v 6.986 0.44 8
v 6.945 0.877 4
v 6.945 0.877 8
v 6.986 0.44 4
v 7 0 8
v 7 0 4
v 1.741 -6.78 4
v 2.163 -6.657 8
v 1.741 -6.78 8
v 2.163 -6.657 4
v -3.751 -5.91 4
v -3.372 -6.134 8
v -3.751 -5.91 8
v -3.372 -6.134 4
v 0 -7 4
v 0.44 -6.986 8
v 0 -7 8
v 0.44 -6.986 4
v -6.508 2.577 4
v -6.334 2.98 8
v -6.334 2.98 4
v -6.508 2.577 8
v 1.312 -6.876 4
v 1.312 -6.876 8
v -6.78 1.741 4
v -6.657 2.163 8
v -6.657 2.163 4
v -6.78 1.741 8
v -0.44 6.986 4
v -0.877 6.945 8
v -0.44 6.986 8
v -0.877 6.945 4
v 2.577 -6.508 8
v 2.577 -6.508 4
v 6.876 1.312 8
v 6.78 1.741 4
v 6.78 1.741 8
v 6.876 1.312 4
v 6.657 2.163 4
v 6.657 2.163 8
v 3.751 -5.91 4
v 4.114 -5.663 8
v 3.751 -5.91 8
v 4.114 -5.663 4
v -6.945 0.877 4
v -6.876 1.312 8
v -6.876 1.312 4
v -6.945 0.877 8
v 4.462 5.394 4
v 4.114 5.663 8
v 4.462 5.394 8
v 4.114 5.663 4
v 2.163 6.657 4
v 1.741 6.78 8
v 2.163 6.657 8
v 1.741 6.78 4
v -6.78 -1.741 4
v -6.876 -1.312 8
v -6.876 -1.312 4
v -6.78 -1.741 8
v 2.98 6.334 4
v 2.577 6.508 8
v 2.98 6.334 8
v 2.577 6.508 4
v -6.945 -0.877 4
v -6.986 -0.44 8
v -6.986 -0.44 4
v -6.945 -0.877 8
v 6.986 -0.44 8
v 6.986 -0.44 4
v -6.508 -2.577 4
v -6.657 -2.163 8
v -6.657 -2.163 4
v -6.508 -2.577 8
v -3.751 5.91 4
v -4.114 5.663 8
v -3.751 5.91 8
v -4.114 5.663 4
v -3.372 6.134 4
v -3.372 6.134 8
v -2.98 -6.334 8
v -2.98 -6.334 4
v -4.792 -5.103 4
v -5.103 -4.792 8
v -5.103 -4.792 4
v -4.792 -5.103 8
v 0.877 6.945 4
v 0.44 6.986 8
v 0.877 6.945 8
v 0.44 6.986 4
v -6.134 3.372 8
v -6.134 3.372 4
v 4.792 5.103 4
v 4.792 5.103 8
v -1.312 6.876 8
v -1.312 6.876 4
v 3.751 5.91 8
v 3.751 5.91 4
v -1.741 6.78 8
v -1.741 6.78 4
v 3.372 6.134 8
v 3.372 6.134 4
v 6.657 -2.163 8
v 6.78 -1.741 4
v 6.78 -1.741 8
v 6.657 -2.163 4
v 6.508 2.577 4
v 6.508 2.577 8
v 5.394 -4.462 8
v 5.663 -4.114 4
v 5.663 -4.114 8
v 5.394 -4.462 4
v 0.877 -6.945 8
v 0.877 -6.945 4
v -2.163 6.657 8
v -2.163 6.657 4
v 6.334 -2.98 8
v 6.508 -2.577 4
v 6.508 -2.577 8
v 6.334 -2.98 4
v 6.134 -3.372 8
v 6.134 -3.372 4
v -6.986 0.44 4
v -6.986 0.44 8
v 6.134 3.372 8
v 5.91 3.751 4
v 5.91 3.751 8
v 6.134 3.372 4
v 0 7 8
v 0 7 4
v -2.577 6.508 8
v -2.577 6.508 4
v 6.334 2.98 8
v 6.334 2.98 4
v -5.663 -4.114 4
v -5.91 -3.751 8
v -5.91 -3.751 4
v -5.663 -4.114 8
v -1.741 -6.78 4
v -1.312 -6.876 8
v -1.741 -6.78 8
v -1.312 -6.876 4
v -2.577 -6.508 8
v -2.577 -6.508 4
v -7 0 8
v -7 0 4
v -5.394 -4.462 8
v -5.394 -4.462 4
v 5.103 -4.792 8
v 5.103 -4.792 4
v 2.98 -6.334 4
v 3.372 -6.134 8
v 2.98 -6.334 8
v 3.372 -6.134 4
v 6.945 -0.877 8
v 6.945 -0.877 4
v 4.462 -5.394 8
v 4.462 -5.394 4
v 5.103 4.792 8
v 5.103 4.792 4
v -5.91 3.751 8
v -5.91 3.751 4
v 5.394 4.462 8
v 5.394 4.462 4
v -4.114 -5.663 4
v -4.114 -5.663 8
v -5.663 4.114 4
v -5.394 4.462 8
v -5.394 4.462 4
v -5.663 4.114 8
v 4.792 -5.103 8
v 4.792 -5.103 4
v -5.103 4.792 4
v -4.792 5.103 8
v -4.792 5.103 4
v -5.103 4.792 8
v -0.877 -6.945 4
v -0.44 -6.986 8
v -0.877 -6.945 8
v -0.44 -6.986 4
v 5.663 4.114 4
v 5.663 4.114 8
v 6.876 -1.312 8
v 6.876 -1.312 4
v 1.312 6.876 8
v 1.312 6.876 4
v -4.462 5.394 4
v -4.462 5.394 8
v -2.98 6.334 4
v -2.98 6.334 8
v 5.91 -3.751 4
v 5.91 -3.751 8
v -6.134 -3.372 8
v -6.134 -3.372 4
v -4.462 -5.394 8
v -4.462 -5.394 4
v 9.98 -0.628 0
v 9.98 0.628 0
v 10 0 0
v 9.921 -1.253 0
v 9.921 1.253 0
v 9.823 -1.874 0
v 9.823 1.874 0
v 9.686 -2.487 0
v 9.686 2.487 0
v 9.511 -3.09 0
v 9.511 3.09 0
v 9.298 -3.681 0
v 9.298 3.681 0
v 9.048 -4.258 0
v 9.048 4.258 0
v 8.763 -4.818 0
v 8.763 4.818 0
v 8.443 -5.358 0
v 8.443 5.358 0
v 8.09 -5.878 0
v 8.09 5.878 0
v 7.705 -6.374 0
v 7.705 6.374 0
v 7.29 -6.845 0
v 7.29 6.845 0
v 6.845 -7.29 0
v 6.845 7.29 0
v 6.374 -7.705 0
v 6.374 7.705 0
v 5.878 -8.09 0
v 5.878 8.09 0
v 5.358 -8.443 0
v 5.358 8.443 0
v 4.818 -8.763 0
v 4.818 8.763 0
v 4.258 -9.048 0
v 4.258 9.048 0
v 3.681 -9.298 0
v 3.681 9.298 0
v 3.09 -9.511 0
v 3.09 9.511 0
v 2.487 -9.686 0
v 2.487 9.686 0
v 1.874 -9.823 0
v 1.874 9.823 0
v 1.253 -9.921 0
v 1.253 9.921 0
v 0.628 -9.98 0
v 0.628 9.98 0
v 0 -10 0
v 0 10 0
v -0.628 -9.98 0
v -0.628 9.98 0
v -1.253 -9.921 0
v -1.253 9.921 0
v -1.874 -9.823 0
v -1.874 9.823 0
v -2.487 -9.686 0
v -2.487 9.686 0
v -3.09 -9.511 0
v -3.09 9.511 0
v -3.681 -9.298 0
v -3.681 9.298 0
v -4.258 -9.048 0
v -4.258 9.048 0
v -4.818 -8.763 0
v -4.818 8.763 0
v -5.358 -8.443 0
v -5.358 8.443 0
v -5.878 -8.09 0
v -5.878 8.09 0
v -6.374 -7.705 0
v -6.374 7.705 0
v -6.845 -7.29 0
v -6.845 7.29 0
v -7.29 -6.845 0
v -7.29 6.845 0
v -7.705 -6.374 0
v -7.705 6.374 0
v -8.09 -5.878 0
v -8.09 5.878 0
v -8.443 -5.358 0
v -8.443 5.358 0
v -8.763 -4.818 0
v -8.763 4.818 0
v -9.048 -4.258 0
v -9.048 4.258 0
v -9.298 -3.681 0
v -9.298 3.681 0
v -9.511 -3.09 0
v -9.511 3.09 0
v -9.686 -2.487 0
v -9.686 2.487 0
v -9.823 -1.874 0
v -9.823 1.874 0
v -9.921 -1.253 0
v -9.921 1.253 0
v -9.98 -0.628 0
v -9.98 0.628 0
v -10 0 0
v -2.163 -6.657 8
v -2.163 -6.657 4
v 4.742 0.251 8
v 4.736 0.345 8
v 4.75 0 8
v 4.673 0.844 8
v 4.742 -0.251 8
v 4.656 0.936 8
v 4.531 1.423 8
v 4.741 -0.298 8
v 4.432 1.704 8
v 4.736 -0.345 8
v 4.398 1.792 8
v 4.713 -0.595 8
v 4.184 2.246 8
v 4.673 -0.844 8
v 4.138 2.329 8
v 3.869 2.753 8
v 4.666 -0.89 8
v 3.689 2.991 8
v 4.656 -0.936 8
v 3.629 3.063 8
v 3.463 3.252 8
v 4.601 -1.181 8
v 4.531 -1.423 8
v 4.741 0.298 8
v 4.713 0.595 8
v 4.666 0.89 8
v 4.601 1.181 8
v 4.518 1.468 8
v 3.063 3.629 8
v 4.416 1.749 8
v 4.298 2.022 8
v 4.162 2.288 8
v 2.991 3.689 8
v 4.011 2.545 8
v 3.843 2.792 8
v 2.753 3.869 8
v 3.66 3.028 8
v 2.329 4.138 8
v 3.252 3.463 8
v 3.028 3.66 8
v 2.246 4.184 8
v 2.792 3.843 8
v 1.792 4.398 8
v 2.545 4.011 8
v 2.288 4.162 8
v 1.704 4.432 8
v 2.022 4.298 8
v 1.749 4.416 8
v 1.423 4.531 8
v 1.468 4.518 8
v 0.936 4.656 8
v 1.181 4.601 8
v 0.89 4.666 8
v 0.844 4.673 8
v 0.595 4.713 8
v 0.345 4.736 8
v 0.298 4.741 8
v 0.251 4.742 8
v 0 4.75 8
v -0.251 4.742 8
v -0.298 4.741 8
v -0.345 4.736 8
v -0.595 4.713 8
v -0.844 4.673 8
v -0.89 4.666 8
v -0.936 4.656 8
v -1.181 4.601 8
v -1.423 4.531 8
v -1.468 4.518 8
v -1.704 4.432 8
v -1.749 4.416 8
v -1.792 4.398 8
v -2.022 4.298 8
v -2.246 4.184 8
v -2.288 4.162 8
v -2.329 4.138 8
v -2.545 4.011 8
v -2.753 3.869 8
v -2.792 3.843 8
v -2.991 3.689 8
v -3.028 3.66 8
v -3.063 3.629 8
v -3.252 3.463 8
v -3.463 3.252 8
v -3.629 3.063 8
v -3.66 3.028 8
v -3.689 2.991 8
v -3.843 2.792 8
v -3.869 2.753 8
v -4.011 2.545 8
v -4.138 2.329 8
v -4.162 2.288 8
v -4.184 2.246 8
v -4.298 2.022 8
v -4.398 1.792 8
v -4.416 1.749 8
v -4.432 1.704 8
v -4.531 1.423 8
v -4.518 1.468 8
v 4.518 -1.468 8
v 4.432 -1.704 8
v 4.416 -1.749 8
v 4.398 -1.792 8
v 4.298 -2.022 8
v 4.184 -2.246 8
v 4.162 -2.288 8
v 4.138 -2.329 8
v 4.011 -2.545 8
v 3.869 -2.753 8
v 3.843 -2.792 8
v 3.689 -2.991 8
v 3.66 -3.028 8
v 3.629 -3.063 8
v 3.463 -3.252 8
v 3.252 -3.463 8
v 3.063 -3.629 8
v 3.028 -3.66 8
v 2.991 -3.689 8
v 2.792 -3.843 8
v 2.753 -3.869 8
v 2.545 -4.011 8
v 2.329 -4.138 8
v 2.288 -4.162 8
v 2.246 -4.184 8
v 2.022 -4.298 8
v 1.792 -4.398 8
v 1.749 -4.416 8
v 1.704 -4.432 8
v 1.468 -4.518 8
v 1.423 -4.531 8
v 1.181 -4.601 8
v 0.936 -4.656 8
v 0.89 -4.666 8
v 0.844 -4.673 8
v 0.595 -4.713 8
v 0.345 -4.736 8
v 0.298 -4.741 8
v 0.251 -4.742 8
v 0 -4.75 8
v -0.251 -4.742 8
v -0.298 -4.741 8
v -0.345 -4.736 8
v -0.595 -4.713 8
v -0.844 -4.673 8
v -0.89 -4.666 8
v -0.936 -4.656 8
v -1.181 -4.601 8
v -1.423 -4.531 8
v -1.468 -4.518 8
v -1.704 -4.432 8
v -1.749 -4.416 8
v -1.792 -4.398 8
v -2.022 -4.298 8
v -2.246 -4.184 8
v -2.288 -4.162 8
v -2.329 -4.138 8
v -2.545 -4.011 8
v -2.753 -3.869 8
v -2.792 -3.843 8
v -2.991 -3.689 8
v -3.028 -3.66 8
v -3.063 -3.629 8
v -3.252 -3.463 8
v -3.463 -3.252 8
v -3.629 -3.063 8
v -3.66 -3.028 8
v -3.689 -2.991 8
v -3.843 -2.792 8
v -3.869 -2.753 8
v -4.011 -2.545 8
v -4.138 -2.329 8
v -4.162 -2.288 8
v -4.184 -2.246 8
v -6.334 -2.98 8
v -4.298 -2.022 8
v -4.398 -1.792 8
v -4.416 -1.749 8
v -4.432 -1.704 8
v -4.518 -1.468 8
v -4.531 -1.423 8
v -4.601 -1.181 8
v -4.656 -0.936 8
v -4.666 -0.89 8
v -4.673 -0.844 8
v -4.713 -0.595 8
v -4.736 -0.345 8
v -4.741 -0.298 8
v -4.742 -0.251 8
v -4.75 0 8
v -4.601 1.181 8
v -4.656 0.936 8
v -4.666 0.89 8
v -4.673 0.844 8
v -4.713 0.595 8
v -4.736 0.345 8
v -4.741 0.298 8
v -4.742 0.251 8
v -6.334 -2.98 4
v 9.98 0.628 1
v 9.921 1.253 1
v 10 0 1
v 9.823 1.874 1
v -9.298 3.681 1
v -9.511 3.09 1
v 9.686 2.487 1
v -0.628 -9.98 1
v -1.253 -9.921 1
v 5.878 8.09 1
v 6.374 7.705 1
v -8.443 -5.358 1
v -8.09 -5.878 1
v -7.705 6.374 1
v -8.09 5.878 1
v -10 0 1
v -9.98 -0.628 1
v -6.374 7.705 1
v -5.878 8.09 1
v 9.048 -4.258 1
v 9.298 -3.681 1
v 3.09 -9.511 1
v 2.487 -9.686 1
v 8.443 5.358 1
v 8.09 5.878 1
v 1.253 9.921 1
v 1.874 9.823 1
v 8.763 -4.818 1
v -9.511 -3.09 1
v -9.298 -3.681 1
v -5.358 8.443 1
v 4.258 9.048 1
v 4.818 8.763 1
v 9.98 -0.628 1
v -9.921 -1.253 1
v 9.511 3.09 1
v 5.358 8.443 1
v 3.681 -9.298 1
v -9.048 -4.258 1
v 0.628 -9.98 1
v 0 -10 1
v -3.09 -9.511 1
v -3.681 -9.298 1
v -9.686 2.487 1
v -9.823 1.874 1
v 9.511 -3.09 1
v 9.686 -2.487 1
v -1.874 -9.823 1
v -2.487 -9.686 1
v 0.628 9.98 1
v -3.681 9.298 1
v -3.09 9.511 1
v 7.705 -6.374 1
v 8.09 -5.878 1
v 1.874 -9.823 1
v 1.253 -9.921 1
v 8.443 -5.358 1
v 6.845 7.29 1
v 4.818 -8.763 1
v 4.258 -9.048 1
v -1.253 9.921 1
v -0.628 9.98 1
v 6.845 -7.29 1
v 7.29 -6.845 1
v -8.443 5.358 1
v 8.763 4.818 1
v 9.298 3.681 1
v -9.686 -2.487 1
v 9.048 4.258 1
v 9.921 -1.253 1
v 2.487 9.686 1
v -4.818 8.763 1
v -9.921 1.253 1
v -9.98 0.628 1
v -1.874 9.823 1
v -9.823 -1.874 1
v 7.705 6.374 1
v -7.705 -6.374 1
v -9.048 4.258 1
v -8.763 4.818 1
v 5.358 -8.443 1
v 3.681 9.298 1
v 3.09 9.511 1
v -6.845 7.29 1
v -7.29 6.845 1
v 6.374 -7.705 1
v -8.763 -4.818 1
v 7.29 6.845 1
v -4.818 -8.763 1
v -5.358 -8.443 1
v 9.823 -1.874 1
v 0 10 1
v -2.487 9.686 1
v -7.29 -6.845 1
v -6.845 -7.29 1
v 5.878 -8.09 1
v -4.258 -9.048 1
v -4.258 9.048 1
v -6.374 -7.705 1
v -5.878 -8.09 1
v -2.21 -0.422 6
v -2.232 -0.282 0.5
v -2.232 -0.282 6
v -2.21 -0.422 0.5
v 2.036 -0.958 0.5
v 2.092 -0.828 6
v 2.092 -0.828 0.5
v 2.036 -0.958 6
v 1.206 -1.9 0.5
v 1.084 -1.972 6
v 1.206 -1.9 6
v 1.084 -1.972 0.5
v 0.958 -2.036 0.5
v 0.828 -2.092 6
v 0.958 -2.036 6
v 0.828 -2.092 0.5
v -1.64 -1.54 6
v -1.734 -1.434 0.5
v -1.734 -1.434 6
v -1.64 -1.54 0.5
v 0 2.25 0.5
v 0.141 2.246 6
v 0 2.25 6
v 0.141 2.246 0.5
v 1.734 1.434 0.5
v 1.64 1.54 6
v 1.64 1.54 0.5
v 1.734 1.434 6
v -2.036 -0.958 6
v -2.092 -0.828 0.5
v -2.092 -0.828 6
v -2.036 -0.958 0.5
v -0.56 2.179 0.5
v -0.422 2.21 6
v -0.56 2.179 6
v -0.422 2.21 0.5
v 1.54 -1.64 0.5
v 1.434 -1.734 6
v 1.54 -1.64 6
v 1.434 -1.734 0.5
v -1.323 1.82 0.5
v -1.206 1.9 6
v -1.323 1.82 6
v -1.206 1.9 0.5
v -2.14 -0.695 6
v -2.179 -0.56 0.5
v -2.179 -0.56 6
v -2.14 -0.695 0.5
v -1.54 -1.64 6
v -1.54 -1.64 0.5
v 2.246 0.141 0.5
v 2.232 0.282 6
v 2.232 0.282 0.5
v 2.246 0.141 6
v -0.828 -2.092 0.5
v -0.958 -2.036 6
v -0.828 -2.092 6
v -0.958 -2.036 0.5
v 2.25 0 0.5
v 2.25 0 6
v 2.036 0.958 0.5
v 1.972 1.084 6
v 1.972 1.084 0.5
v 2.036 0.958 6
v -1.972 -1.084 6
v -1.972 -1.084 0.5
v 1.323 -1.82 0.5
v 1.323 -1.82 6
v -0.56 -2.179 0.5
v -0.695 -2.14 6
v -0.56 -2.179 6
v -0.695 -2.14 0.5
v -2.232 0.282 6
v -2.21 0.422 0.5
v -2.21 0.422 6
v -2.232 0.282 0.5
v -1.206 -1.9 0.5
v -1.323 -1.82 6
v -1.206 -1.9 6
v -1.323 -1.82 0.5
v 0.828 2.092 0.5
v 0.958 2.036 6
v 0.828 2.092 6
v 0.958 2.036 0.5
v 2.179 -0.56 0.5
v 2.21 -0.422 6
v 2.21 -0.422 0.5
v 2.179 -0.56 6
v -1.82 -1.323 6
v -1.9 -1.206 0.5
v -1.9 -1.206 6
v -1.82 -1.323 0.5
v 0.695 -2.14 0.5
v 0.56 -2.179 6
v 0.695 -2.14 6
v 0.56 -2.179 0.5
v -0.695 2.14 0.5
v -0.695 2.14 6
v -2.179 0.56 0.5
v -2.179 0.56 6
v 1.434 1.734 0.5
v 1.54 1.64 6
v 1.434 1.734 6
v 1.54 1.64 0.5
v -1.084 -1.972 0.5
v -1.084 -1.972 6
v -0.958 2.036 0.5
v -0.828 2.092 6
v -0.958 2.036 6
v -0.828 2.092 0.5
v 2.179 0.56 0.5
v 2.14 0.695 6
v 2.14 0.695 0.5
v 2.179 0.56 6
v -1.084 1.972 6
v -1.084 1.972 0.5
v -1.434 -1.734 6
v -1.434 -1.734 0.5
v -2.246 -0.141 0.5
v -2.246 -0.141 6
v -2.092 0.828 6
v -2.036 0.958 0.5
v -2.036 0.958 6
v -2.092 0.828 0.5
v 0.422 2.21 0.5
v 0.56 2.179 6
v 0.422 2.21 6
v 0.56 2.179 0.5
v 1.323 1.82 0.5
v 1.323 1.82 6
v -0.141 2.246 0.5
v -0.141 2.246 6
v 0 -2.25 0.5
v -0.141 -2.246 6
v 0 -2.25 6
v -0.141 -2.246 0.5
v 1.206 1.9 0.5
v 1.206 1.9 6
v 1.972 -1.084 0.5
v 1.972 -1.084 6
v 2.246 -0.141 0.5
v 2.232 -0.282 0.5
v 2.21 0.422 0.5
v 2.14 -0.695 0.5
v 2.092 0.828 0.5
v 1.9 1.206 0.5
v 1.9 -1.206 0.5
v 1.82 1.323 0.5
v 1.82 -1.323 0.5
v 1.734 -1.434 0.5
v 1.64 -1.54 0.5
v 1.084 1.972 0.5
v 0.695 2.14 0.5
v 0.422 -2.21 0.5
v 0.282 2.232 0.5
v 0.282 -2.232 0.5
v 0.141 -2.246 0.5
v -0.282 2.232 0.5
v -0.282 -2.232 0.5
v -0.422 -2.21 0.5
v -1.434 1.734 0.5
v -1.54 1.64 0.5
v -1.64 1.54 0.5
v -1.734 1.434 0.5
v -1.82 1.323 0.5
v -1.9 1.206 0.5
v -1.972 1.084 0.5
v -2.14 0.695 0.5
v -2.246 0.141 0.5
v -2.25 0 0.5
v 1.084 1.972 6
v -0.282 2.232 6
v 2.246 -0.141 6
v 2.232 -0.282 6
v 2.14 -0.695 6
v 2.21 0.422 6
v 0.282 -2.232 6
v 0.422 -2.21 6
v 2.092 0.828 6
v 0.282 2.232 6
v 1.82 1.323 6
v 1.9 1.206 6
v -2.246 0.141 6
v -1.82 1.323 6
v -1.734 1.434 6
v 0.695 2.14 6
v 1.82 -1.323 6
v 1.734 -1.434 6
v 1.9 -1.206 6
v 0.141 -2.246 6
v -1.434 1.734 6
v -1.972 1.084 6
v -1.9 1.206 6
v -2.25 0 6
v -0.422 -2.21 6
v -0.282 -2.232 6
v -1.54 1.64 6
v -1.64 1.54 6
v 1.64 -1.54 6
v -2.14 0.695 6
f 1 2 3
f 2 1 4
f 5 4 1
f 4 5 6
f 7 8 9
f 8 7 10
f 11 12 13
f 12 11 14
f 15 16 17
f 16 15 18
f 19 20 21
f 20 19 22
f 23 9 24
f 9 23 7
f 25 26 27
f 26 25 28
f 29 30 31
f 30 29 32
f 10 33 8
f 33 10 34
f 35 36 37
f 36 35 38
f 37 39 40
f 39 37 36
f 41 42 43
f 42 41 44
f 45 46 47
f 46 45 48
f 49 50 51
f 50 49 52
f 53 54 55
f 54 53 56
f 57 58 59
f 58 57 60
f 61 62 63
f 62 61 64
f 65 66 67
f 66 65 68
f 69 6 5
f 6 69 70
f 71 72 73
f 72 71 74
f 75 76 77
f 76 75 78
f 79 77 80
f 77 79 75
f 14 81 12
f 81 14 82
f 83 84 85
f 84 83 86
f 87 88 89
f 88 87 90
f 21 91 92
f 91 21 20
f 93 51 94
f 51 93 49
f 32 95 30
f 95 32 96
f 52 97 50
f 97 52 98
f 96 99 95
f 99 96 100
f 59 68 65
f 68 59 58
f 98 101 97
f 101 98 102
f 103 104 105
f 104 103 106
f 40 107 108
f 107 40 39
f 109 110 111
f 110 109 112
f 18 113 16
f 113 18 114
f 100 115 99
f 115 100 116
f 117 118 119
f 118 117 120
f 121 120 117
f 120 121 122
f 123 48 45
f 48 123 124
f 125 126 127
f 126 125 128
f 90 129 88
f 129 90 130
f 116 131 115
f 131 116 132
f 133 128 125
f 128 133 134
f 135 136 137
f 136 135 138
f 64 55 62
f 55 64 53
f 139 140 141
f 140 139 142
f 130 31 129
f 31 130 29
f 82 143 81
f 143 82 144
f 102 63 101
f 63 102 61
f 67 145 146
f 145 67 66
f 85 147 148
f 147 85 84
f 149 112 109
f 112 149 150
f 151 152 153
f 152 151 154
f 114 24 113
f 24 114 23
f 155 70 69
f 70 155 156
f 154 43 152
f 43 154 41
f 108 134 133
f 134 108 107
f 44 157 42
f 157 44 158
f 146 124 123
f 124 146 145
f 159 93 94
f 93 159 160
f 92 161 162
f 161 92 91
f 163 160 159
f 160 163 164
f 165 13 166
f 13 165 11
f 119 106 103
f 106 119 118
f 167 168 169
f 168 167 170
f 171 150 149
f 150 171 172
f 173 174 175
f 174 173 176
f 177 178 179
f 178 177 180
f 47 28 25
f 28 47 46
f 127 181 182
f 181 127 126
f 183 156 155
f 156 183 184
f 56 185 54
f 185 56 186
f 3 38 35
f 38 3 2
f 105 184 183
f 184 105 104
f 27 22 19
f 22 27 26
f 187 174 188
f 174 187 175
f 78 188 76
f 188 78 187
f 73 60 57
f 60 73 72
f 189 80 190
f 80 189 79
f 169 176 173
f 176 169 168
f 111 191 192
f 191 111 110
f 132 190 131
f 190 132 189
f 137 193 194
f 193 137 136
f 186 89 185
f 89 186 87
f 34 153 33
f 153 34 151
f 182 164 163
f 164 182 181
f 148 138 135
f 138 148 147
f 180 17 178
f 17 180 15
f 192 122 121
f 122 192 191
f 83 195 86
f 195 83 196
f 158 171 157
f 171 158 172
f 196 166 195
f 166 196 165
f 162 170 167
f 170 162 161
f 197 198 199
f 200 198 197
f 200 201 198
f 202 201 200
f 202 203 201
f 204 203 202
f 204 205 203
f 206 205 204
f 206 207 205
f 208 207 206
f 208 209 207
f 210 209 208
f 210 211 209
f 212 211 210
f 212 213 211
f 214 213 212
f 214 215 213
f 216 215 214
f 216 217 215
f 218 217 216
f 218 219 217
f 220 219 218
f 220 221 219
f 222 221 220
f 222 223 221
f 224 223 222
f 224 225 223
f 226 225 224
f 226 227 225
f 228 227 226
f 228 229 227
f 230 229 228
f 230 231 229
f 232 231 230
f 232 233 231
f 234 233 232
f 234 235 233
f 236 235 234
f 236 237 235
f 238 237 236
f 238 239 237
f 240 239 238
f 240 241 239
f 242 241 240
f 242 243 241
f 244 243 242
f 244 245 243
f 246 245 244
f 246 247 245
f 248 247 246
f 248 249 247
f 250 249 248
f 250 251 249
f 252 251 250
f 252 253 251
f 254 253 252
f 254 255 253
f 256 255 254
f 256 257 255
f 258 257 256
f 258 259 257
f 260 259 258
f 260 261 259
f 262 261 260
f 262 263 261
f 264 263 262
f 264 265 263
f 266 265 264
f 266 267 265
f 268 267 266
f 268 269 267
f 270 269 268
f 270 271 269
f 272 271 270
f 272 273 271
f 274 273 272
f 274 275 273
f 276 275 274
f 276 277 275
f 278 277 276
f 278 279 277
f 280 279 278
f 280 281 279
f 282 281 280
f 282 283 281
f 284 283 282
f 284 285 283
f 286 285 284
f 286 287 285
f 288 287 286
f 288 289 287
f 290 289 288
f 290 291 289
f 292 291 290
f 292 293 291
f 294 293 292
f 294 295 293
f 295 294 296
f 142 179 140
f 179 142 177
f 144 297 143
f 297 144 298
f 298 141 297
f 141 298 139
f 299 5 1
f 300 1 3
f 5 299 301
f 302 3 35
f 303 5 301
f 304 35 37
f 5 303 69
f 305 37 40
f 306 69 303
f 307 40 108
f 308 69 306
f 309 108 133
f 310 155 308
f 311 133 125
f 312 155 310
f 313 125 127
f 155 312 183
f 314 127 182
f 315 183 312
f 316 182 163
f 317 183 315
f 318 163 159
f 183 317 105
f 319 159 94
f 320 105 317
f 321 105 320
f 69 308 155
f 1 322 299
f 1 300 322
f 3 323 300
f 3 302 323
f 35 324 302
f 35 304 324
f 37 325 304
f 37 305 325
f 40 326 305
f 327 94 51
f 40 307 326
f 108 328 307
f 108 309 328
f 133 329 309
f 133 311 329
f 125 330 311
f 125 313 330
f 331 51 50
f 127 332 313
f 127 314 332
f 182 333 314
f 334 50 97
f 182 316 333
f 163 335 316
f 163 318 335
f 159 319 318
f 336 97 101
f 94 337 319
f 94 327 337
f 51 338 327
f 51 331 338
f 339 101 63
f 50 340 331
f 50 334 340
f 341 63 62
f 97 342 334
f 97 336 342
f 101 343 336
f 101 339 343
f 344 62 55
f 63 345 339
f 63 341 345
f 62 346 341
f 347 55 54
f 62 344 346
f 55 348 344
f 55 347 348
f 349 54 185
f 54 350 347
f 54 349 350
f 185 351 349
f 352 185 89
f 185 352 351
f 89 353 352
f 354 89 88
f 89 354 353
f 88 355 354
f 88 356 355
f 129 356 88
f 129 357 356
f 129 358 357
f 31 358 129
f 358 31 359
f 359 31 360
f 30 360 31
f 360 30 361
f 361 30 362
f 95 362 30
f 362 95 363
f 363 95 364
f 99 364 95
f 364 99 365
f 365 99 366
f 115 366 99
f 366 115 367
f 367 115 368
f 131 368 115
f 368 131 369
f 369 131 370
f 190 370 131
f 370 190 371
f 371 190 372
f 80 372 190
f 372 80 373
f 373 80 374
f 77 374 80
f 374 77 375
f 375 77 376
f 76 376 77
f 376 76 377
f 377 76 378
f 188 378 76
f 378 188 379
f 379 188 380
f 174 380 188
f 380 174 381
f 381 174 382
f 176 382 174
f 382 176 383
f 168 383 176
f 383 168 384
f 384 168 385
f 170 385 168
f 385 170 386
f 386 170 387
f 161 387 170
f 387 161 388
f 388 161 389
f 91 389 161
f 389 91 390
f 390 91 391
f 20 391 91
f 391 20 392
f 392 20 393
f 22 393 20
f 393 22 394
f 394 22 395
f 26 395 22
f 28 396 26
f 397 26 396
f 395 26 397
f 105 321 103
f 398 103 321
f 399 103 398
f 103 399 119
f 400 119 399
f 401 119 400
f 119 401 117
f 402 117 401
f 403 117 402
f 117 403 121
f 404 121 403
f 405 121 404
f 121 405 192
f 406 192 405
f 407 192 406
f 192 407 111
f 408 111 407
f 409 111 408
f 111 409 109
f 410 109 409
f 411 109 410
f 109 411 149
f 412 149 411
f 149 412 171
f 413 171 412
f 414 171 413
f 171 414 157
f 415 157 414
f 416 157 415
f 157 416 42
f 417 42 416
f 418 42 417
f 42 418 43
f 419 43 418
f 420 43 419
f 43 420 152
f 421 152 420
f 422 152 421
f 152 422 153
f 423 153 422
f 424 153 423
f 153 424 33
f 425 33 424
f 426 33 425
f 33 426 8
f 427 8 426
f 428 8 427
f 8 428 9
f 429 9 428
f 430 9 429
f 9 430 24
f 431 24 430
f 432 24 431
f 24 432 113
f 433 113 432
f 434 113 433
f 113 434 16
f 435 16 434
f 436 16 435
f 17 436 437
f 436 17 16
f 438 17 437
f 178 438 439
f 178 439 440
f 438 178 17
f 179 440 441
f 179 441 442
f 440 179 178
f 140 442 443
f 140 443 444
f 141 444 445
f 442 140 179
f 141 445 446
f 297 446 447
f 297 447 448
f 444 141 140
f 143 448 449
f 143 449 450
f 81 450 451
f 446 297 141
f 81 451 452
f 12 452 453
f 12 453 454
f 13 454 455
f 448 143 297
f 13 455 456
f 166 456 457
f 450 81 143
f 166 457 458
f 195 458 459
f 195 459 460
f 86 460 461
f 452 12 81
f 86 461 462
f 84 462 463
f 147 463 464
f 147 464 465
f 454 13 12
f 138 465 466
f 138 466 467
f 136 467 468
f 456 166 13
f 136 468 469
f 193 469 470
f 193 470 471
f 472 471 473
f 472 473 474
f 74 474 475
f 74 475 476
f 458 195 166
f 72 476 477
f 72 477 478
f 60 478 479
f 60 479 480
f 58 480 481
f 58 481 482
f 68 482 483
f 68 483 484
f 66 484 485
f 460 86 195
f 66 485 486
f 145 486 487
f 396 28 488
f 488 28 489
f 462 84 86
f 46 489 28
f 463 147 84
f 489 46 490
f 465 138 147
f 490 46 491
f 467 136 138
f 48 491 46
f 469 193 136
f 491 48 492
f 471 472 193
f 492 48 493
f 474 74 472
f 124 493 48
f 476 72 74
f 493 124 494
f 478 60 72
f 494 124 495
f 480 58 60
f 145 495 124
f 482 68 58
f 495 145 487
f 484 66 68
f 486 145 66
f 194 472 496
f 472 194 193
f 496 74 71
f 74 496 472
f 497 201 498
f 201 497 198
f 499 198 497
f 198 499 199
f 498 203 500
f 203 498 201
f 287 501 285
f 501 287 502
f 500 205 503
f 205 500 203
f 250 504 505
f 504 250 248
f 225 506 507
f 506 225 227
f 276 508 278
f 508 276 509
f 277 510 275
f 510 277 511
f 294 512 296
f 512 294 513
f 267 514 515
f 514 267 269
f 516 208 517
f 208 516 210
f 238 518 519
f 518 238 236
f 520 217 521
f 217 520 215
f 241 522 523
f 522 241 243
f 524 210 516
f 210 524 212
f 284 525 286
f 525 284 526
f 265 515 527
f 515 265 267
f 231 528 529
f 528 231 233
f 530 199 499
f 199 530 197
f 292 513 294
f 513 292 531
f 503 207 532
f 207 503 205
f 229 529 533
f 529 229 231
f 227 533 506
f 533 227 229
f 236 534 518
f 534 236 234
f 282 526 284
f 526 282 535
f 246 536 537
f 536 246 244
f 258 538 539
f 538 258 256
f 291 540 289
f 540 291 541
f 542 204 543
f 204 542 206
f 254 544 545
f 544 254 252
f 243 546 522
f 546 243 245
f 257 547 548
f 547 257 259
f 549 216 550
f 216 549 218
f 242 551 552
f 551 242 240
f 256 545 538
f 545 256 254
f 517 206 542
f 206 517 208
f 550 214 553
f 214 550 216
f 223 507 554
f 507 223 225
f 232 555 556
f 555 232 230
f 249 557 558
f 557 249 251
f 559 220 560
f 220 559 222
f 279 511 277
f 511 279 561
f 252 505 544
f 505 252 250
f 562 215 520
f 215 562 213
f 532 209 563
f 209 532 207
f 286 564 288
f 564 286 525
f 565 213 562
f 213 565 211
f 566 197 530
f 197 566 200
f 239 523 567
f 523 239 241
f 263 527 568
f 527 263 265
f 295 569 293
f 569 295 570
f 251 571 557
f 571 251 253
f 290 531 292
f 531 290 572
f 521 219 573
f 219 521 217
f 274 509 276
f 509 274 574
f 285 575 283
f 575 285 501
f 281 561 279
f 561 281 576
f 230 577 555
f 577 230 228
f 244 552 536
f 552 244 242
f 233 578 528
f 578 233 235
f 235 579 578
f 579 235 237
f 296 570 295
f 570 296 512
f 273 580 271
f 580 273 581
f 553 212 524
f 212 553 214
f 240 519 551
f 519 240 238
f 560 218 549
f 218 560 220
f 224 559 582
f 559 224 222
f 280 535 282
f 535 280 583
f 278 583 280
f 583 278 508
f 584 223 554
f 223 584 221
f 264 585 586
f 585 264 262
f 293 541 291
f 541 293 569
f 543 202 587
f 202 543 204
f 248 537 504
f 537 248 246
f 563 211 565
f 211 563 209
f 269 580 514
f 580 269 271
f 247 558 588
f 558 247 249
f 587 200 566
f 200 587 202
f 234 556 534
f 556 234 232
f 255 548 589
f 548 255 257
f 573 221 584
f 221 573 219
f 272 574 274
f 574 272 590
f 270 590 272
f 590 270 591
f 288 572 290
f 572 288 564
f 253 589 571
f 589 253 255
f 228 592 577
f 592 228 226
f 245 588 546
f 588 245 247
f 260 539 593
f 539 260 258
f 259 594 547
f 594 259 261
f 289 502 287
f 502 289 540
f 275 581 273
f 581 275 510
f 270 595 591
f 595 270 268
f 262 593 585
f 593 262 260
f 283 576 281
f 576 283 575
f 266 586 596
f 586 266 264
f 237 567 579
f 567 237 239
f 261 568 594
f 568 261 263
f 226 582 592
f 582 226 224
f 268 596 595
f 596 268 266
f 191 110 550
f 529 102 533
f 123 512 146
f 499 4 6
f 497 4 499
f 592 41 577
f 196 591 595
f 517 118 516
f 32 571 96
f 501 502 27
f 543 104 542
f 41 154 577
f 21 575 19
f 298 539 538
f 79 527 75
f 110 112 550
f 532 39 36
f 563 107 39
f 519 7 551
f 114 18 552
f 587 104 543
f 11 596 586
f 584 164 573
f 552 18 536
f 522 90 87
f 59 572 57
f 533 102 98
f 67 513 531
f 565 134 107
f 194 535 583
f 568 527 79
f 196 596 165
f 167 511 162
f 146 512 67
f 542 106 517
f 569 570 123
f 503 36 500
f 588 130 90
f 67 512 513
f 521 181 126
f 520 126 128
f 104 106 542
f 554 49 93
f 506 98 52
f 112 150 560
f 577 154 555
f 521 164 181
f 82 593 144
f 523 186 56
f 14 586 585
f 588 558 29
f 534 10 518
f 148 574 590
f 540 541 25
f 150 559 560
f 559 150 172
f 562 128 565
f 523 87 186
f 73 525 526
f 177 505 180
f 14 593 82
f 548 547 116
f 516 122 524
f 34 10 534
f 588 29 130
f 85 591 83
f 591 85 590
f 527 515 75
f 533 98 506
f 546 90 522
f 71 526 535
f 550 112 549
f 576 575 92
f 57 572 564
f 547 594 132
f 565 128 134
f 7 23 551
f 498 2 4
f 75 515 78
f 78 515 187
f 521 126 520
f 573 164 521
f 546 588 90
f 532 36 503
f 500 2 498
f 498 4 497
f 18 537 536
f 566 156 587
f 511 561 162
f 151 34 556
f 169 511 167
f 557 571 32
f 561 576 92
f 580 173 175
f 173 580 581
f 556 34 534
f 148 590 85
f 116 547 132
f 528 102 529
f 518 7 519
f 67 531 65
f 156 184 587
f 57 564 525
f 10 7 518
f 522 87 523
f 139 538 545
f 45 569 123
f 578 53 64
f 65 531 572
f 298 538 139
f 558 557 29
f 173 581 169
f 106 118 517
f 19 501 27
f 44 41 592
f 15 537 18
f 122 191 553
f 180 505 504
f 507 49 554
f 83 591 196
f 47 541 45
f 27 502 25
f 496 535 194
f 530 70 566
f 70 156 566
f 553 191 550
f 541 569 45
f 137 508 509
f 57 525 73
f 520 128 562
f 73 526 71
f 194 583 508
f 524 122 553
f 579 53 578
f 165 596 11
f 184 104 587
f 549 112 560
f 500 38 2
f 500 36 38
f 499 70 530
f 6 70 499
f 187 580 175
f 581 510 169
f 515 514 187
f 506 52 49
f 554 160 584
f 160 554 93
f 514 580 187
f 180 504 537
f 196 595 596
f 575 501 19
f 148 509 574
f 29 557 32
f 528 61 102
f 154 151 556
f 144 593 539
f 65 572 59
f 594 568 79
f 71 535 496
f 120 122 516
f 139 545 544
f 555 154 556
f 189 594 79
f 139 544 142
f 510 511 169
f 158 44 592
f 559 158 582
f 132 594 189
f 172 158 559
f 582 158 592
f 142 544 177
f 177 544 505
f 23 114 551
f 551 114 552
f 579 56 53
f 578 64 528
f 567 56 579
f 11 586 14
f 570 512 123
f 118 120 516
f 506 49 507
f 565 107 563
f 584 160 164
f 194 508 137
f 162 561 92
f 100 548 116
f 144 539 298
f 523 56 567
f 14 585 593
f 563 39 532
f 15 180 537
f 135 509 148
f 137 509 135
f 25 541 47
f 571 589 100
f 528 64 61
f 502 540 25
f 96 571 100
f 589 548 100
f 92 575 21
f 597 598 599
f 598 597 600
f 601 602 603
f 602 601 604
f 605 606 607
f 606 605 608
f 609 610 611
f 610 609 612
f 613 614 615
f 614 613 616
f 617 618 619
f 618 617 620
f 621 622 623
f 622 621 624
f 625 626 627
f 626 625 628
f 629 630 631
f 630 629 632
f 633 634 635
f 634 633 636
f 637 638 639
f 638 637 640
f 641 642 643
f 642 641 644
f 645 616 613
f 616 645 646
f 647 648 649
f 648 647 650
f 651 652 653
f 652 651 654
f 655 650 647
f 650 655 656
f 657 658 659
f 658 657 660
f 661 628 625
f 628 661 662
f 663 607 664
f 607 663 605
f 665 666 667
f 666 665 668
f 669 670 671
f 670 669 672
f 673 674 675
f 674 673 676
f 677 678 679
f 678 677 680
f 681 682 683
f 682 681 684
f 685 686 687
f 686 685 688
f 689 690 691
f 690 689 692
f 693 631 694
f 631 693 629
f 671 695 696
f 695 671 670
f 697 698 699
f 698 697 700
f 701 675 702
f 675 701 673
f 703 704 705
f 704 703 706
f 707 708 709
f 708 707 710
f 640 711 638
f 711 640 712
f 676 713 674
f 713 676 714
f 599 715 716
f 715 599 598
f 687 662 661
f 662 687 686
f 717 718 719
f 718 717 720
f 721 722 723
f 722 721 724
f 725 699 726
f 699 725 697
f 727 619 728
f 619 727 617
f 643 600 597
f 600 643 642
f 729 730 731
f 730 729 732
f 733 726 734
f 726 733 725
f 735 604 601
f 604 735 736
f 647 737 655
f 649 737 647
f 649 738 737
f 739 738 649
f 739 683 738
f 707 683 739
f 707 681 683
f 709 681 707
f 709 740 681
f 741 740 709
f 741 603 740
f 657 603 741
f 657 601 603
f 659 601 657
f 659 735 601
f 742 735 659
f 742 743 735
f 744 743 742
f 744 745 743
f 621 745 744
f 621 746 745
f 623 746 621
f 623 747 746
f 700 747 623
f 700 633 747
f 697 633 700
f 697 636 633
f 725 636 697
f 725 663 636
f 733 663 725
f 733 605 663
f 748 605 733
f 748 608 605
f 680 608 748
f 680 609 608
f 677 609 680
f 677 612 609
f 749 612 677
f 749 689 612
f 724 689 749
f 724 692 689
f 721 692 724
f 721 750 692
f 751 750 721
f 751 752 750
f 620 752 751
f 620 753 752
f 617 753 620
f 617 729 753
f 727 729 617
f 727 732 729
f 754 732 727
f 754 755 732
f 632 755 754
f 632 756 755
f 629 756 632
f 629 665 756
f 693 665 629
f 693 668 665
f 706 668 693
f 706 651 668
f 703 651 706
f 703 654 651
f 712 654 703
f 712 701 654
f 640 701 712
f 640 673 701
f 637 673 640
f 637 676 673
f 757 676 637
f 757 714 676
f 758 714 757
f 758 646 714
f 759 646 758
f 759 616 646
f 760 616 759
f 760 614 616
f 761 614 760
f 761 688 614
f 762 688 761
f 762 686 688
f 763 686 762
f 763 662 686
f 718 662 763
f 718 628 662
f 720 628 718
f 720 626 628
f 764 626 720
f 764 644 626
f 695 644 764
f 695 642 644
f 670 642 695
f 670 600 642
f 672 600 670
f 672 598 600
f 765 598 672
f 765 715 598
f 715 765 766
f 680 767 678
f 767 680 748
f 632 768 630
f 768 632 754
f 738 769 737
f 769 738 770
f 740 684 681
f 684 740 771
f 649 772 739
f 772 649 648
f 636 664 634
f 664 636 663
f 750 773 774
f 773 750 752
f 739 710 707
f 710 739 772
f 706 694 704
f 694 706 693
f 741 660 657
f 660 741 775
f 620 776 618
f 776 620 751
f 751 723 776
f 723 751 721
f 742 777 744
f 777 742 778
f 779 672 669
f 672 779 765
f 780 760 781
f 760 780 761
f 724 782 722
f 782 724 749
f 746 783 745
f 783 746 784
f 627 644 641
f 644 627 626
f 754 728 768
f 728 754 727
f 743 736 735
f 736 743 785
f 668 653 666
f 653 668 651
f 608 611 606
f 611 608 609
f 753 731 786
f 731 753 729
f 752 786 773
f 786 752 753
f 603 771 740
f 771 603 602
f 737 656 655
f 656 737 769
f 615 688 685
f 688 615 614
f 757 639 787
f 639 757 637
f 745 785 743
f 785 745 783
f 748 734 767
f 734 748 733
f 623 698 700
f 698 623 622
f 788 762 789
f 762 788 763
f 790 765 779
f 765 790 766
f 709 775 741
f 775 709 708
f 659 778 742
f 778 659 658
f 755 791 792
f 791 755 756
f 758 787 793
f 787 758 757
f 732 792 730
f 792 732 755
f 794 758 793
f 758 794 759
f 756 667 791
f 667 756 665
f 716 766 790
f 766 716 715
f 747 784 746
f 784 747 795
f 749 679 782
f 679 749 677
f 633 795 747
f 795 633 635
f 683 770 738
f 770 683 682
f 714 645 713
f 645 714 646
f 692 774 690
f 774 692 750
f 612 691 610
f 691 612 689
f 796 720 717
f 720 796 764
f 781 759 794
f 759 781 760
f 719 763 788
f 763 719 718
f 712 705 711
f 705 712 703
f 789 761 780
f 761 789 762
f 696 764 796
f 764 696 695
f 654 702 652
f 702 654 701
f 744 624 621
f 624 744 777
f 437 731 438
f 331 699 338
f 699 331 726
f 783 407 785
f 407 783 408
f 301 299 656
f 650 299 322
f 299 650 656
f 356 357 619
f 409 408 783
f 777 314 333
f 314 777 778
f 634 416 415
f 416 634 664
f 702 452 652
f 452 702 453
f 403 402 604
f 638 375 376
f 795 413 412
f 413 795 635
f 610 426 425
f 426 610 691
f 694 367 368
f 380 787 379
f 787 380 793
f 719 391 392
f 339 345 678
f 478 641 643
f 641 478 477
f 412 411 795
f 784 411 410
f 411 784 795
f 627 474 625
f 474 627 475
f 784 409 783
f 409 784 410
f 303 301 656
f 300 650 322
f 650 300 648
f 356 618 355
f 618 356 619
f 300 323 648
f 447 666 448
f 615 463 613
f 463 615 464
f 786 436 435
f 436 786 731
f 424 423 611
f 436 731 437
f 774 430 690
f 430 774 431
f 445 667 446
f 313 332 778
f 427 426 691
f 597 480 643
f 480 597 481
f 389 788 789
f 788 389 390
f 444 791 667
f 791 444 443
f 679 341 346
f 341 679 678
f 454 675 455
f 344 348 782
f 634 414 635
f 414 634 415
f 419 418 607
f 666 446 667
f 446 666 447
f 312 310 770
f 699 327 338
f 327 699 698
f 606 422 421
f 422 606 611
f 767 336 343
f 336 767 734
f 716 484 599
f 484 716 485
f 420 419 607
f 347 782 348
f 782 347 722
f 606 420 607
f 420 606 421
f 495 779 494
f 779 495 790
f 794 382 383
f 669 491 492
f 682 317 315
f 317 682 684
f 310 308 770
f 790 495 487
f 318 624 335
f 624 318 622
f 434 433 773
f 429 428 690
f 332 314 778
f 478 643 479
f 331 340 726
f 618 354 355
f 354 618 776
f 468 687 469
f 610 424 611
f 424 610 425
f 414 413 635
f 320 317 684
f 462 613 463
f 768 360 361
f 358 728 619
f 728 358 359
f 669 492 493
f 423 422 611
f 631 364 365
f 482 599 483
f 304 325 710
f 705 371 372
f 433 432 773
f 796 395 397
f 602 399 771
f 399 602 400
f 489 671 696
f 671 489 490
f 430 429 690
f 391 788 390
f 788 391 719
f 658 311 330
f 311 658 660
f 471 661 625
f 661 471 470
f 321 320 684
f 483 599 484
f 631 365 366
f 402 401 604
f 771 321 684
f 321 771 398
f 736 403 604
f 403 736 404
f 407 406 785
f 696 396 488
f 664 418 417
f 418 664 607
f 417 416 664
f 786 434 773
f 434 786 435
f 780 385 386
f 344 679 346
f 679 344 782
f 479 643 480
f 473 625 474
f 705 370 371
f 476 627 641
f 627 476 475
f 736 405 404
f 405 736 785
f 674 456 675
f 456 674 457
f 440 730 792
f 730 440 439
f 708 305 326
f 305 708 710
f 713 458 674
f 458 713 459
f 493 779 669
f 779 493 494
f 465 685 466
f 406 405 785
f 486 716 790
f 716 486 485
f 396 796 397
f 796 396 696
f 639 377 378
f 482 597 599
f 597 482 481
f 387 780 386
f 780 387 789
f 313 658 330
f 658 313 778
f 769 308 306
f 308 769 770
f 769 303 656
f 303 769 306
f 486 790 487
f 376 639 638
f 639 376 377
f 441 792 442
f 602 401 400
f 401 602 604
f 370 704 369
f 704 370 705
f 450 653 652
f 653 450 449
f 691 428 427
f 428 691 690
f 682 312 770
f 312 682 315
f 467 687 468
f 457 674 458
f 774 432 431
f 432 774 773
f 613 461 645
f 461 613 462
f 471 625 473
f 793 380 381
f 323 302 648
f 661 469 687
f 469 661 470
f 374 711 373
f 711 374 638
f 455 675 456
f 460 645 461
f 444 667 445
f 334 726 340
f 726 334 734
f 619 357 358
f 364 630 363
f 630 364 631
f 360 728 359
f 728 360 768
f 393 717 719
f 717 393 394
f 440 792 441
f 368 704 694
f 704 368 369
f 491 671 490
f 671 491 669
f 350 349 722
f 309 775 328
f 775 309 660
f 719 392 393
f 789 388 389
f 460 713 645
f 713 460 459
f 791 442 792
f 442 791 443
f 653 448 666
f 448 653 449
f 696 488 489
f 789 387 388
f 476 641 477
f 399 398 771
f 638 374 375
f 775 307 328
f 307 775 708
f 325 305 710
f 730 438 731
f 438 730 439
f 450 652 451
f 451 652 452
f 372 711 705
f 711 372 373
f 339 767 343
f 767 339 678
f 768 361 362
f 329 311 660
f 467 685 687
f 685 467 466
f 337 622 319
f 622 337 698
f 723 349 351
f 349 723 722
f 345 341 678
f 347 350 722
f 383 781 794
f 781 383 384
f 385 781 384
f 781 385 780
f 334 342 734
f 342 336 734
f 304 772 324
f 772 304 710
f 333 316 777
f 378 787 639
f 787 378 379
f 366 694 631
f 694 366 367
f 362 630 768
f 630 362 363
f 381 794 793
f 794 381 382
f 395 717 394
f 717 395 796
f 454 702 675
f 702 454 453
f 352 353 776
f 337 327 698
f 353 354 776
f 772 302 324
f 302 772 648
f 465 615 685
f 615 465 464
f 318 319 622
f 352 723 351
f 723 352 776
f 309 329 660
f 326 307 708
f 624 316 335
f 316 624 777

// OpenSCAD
difference(){
 union(){
  cylinder( r=7, h=8, $fn=100);
  cylinder( r=10, h=1, $fn=100);
  translate(v = [0, 0, 1]) {
  	cylinder( r1=10, r2=7, h=3, $fn=100);
  }
 }

 translate(v = [0, 0, 0.5]) {
  cylinder( r=2.25, h=8, $fn=100);
 }
 translate(v = [0, 0, 6]) {
  cylinder( r1=2.25, r2=6, h=3, $fn=100);
 }
}
 
